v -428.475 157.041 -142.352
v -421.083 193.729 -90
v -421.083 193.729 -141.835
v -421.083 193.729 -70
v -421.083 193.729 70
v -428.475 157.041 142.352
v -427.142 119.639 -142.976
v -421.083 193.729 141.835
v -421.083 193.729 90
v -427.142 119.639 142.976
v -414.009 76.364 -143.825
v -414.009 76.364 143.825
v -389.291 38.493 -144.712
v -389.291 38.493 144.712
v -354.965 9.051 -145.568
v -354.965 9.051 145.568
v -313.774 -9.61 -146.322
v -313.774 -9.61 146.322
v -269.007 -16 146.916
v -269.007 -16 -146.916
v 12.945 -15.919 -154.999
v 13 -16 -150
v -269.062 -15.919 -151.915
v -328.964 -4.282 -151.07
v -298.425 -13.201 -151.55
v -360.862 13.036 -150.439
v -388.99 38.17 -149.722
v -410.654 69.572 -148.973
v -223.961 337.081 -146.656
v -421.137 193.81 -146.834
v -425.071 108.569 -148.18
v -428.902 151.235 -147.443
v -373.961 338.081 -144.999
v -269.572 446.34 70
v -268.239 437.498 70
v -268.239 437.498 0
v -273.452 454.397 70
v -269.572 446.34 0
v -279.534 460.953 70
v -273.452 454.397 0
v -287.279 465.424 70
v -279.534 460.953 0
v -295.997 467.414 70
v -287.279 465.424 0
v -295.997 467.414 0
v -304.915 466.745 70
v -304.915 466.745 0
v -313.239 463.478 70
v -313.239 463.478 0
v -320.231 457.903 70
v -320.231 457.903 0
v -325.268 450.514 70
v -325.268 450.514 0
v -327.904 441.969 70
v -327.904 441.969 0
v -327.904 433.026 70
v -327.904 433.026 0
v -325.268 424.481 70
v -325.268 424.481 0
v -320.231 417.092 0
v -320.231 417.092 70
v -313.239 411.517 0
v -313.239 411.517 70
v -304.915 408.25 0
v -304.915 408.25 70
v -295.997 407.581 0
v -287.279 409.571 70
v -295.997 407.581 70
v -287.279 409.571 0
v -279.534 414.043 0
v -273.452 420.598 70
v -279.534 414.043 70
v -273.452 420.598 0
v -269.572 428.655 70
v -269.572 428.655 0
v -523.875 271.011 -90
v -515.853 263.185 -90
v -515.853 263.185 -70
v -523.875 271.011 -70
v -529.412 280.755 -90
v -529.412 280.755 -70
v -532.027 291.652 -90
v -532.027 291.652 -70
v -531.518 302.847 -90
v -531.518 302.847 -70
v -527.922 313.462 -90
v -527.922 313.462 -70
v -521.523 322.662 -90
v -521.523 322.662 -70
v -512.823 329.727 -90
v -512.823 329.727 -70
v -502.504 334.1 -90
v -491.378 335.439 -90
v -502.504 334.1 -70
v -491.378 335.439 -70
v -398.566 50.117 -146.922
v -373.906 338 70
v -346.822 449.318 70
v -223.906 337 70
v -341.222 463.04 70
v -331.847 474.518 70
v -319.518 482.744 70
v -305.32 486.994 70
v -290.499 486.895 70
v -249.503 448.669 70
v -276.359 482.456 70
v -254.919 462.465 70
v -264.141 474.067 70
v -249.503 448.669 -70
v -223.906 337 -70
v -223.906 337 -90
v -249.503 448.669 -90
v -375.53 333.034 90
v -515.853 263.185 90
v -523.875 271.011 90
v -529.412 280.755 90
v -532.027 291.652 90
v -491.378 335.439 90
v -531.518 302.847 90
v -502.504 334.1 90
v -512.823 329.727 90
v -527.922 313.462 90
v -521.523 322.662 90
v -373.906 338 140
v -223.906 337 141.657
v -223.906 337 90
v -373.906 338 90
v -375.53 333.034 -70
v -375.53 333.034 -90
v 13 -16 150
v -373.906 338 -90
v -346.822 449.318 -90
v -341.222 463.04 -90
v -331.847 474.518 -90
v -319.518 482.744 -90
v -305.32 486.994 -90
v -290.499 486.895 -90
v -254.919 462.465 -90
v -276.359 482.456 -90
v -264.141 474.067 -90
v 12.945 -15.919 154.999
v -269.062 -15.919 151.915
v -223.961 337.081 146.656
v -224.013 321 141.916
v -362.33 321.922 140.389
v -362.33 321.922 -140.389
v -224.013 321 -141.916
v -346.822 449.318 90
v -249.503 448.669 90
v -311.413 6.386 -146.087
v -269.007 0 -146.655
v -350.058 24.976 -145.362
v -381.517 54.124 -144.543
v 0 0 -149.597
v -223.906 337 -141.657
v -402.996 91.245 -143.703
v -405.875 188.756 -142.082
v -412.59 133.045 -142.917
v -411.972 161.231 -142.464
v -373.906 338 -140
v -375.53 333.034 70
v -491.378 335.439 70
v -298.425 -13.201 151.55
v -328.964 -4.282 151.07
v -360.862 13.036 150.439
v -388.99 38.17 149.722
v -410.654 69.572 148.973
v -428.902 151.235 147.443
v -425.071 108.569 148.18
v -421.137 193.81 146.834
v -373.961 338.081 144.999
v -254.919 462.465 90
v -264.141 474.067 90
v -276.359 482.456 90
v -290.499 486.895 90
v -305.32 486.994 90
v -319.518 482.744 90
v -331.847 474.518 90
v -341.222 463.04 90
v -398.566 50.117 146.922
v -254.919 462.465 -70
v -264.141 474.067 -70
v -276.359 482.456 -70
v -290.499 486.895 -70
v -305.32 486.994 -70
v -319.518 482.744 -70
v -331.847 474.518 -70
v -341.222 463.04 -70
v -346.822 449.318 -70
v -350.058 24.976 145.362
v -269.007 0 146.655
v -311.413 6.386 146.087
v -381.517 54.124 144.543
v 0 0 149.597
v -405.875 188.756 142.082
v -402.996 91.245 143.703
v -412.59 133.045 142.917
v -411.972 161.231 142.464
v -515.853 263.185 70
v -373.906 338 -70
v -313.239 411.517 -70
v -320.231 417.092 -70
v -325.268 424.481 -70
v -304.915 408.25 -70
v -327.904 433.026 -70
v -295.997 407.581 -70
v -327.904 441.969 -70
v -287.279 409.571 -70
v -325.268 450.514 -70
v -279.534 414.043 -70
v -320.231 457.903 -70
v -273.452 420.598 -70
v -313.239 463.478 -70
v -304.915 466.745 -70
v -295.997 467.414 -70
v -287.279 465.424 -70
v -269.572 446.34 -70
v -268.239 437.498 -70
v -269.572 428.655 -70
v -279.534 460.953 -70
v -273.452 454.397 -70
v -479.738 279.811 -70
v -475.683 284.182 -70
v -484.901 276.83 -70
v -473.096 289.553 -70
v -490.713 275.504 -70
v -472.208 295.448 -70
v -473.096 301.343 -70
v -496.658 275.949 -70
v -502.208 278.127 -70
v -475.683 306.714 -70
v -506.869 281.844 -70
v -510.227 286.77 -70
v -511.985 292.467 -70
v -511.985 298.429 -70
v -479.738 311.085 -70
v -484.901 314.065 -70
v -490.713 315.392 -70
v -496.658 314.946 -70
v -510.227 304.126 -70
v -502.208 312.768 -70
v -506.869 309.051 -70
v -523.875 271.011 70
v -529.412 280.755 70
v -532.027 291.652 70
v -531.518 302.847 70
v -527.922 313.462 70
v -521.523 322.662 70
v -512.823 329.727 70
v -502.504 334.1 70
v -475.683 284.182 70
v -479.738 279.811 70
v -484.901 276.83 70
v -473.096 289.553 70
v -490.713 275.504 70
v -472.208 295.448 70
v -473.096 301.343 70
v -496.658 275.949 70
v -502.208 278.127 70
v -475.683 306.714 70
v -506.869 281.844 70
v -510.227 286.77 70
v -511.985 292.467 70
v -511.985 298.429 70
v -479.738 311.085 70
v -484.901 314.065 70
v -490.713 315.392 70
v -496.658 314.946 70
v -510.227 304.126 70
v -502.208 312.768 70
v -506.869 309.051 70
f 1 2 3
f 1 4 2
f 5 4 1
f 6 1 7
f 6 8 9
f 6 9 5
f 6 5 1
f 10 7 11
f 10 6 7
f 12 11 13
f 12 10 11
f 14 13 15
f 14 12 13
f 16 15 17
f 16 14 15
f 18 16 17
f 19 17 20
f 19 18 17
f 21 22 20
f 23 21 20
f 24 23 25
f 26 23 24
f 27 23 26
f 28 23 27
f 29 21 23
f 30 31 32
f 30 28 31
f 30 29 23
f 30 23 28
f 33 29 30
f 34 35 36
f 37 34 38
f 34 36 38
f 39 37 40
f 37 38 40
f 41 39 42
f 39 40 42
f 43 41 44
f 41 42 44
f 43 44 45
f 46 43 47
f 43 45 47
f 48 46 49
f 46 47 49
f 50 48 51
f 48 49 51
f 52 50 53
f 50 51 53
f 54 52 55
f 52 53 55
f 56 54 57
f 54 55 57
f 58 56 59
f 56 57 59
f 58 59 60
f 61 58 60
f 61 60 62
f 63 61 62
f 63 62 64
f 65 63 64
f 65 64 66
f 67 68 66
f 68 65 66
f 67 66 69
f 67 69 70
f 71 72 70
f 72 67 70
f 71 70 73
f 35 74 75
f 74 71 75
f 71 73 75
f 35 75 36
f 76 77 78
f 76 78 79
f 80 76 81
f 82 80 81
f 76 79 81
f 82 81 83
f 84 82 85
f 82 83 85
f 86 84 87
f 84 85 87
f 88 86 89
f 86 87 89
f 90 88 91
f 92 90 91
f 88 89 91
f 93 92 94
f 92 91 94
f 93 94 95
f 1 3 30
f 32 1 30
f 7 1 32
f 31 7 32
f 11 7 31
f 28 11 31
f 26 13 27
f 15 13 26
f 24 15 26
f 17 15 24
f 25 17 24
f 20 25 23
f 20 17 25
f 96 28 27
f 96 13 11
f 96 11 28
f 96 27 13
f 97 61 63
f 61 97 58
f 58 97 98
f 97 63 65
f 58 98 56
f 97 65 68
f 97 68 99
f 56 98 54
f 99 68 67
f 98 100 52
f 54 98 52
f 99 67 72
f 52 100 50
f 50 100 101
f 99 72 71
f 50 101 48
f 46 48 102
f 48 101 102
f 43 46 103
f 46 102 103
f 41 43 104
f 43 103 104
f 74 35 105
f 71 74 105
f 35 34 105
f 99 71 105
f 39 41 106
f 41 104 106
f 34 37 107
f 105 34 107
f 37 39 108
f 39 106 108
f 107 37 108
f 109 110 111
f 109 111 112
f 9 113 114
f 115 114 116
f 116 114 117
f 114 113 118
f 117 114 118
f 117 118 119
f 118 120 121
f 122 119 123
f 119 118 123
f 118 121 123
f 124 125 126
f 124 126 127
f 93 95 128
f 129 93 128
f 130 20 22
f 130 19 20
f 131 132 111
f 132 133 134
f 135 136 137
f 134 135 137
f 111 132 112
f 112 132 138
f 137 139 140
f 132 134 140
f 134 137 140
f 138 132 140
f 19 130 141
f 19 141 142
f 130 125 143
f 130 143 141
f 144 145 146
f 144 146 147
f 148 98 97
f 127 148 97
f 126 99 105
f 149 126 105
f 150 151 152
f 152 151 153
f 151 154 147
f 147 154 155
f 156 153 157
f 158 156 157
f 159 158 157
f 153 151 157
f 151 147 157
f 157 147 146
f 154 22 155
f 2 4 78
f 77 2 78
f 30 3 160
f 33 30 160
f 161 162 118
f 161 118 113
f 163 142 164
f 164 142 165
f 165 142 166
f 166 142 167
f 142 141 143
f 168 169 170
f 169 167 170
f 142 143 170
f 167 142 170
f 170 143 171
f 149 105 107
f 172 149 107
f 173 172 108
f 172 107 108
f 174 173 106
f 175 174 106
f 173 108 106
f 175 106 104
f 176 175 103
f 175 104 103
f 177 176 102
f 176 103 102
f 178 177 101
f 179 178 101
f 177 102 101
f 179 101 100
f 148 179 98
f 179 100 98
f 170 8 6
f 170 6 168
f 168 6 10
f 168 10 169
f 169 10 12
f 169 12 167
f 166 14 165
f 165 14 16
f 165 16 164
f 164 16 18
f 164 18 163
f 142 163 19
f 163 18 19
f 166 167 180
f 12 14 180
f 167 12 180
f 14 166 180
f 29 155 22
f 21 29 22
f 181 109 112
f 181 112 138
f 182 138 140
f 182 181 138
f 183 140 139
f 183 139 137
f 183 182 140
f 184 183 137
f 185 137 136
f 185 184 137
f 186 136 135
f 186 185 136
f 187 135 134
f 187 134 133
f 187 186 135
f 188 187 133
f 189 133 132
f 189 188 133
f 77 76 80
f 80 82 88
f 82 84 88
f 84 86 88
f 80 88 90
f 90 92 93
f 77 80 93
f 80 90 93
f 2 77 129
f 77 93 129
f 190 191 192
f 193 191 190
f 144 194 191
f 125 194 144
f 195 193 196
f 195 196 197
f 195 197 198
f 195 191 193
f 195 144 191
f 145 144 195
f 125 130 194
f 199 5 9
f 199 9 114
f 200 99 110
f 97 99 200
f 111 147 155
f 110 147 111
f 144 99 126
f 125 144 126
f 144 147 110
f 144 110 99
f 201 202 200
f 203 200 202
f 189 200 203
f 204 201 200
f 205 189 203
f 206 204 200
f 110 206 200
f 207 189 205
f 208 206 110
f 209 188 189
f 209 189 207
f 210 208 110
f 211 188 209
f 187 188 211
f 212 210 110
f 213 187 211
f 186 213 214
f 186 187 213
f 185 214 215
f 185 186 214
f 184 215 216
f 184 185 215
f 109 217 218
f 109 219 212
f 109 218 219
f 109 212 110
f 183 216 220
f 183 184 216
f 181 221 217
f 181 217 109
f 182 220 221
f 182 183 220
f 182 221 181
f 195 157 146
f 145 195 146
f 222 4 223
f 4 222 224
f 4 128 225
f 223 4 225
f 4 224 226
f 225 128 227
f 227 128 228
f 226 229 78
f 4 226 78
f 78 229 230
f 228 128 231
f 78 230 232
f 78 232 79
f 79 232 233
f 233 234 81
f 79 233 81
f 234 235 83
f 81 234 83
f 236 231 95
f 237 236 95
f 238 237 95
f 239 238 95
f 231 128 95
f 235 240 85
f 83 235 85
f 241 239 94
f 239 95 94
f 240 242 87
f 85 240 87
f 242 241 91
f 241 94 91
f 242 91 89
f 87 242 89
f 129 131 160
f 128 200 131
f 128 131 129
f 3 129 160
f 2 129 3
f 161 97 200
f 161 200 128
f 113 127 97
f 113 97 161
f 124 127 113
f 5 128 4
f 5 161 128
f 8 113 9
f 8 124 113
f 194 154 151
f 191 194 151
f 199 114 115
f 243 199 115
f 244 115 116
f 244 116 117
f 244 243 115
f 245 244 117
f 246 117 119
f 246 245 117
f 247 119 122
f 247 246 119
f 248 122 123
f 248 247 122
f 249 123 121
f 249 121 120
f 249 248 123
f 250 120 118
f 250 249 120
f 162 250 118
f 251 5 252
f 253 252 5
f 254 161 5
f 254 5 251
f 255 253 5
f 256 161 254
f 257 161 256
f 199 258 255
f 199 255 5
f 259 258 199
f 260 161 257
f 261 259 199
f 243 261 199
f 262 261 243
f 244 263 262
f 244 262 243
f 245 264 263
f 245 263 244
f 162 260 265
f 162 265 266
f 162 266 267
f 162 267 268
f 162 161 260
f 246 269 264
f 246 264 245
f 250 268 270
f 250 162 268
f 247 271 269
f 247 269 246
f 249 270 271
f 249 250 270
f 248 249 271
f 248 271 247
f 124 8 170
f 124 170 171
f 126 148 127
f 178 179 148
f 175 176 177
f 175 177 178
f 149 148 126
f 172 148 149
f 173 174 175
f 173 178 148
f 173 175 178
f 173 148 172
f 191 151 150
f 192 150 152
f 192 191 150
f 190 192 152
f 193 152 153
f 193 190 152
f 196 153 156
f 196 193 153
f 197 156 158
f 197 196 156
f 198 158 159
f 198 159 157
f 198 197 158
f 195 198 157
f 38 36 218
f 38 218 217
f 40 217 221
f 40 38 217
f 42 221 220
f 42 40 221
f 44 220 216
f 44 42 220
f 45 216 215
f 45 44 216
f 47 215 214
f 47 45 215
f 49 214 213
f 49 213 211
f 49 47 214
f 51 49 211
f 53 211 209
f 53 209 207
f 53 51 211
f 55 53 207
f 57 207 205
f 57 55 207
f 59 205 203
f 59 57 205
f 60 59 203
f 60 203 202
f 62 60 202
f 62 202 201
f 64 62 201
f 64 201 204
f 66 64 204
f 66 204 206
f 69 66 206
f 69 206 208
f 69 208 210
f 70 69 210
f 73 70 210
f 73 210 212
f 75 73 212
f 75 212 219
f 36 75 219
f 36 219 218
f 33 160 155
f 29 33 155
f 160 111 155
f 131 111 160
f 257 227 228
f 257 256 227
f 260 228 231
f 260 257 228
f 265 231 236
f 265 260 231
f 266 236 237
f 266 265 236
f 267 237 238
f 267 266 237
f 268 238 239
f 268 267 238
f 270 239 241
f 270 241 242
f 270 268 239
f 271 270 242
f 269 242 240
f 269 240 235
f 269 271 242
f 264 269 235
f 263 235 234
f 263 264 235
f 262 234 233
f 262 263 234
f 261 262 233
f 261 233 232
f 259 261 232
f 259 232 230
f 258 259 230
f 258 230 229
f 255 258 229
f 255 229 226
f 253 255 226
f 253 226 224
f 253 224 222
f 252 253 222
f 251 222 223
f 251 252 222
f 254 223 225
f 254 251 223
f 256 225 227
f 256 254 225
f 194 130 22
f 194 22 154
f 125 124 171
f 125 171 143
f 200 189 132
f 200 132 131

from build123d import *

# Parameters (mm, degrees)
BOSS_EXTRUDE1_DEPTH = 150
CUT_EXTRUDE1_DEPTH  = 368.015632897
BOSS_EXTRUDE3_DEPTH = 5
BOSS_EXTRUDE4_START = 70
BOSS_EXTRUDE4_DEPTH = 20
SKETCH6_R           = 30
SKETCH6_R_2         = 20
BOSS_EXTRUDE5_DEPTH = 90


with BuildPart() as part:
    # Sketch1 → Boss-Extrude1 (new body, symmetric)
    with BuildSketch(Plane.XY):
        with BuildLine():
            Line((0, 0), (-269.007095808, 0))
            ThreePointArc((-269.007095808, 0), (-385.585141332, 59.468589851), (-405.875242761, 188.756120808))
            Line((-405.875242761, 188.756120808), (-362.32962564, 321.922441203))
            Line((-362.32962564, 321.922441203), (-224.01265789, 321))
            Line((-224.01265789, 321), (-223.905955644, 336.999644203))
            Line((-223.905955644, 336.999644203), (-373.905955644, 338))
            Line((-373.905955644, 338), (-421.082814644, 193.72902312))
            ThreePointArc((-421.082814644, 193.72902312), (-398.538257501, 50.076210945), (-269.007095808, -16))
            Line((-269.007095808, -16), (13, -16))
            Line((13, -16), (0, 0))
        make_face()
    extrude(amount=BOSS_EXTRUDE1_DEPTH, both=True)

    # Sketch2 → Cut-Extrude1 (cut, through all)
    with BuildSketch(Plane(origin=(1.559593234, 1.046677898, 0), x_dir=(0, 0, -1), z_dir=(0.83033878, 0.557258925, 0))):
        Polygon((-150, -20.529786514), (-140, 489.016938742), (-150, 489.016938742), align=None)
        Polygon((140, 489.016938742), (150, 489.016938742), (150, -20.529786514), align=None)
    extrude(amount=-CUT_EXTRUDE1_DEPTH, mode=Mode.SUBTRACT)

    # Sketch4 → Boss-Extrude3 (add)
    with BuildSketch(Plane(origin=(-1.635418654, 2.436841241, 149.539501663), x_dir=(0.999940218, 0.000134312, 0.010933523), z_dir=(-0.01093426, 0.016292498, 0.99980748))):
        with BuildLine():
            Line((14.637102301, -18.441255084), (-267.38685506, -18.403370819))
            add(Edge.make_bspline(
                [(-419.48086469, 191.373926331), (-488.057520629, -18.373728139), (-267.38685506, -18.403370819)],
                knots=[0.663674022, 0.663674022, 0.663674022, 2.550511677, 2.550511677, 2.550511677], degree=2, weights=[1, 0.587023682, 1]))
            Line((-419.48086469, 191.373926331), (-372.30751216, 335.657719572))
            Line((-372.30751216, 335.657719572), (-222.298499603, 334.637080266))
            Line((-222.298499603, 334.637080266), (14.637102301, -18.441255084))
        make_face()
    boss_extrude3 = extrude(amount=BOSS_EXTRUDE3_DEPTH)

    # Sketch5 → Boss-Extrude4 (add)
    with BuildSketch(Plane.XY.offset(BOSS_EXTRUDE4_START)):
        with BuildLine():
            Line((-373.905955644, 338), (-223.905955644, 336.999644203))
            Line((-223.905955644, 336.999644203), (-249.503039478, 448.668975164))
            ThreePointArc((-249.503039478, 448.668975164), (-297.905622093, 487.496486507), (-346.8217607, 449.317997476))
            Line((-346.8217607, 449.317997476), (-373.905955644, 338))
        make_face()
        with BuildLine():
            Line((-421.082814644, 193.72902312), (-515.85308915, 263.184838763))
            ThreePointArc((-515.85308915, 263.184838763), (-530.093343715, 308.281281099), (-491.377505751, 335.439297452))
            Line((-491.377505751, 335.439297452), (-373.905955644, 333))
            Line((-373.905955644, 333), (-421.082814644, 193.72902312))
        make_face()
    boss_extrude4 = extrude(amount=BOSS_EXTRUDE4_DEPTH)

    # Mirror4: Boss-Extrude3, Boss-Extrude4 across plane
    add(boss_extrude3.mirror(Plane.XY))
    add(boss_extrude4.mirror(Plane.XY))

    # Sketch6 → Boss-Extrude5 (add, symmetric)
    with BuildSketch(Plane.XY):
        with Locations((-298.23906661, 437.497598372)):
            Circle(SKETCH6_R)
        with Locations((-492.207926981, 295.447918374)):
            Circle(SKETCH6_R_2)
    extrude(amount=BOSS_EXTRUDE5_DEPTH, both=True)


solid = part.part
